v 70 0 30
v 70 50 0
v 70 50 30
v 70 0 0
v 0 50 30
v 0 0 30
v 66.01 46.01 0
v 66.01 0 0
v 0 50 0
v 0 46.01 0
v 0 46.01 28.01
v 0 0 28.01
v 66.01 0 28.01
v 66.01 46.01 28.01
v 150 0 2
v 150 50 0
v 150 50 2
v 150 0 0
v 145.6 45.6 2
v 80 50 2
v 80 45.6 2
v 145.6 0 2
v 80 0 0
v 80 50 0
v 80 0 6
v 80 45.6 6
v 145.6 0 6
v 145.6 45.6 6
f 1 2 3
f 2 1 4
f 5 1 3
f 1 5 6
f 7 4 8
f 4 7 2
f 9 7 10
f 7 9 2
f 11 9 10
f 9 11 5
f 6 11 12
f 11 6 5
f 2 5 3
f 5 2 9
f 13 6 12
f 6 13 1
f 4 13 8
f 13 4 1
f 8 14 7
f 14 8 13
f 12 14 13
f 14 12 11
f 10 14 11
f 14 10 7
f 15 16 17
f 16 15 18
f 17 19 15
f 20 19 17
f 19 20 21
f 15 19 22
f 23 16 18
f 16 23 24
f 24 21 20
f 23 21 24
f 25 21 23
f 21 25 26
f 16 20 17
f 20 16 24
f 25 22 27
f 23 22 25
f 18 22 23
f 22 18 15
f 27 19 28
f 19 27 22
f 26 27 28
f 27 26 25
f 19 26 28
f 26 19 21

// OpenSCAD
$fn = 64;

// Part 1: Box Dimensions
box_x = 70;
box_y = 50;
box_z = 30;
wall_thick = 2;
floor_thick = 2;

// Part 2: Lid Dimensions
lid_plate_x = 70;
lid_plate_y = 50;
lid_plate_z = 2;
lip_thick = 1.5;
lip_height = 4;
lip_outer_x = 65.6;
lip_outer_y = 45.6;

// Assembly Layout
gap = 10;

module box_part() {
    // Calculate inner cavity dimensions
    inner_x = box_x - (2 * wall_thick);
    inner_y = box_y - (2 * wall_thick);
    inner_z = box_z - floor_thick;

    // Create the solid outer block
    difference() {
        cube([box_x, box_y, box_z]);

        // Create the cutting shape (inner cavity)
        // Extend dimensions by 0.01mm to ensure clean cuts (Rule 5)
        cut_x = inner_x + 0.01;
        cut_y = inner_y + 0.01;
        cut_z = inner_z + 0.01;

        cube([cut_x, cut_y, cut_z]);
    }
}

module lid_part() {
    // Base Plate
    translate([0, 0, 0])
    cube([lid_plate_x, lid_plate_y, lid_plate_z]);

    // Lip
    // Positioned on top of the plate (z = lid_plate_z)
    translate([0, 0, lid_plate_z])
    cube([lip_outer_x, lip_outer_y, lip_height]);
}

// Assembly
union() {
    // Part 1: Box
    translate([0, 0, 0])
    box_part();

    // Part 2: Lid
    // Positioned 10mm to the right of the box
    translate([box_x + gap, 0, 0])
    lid_part();
}
